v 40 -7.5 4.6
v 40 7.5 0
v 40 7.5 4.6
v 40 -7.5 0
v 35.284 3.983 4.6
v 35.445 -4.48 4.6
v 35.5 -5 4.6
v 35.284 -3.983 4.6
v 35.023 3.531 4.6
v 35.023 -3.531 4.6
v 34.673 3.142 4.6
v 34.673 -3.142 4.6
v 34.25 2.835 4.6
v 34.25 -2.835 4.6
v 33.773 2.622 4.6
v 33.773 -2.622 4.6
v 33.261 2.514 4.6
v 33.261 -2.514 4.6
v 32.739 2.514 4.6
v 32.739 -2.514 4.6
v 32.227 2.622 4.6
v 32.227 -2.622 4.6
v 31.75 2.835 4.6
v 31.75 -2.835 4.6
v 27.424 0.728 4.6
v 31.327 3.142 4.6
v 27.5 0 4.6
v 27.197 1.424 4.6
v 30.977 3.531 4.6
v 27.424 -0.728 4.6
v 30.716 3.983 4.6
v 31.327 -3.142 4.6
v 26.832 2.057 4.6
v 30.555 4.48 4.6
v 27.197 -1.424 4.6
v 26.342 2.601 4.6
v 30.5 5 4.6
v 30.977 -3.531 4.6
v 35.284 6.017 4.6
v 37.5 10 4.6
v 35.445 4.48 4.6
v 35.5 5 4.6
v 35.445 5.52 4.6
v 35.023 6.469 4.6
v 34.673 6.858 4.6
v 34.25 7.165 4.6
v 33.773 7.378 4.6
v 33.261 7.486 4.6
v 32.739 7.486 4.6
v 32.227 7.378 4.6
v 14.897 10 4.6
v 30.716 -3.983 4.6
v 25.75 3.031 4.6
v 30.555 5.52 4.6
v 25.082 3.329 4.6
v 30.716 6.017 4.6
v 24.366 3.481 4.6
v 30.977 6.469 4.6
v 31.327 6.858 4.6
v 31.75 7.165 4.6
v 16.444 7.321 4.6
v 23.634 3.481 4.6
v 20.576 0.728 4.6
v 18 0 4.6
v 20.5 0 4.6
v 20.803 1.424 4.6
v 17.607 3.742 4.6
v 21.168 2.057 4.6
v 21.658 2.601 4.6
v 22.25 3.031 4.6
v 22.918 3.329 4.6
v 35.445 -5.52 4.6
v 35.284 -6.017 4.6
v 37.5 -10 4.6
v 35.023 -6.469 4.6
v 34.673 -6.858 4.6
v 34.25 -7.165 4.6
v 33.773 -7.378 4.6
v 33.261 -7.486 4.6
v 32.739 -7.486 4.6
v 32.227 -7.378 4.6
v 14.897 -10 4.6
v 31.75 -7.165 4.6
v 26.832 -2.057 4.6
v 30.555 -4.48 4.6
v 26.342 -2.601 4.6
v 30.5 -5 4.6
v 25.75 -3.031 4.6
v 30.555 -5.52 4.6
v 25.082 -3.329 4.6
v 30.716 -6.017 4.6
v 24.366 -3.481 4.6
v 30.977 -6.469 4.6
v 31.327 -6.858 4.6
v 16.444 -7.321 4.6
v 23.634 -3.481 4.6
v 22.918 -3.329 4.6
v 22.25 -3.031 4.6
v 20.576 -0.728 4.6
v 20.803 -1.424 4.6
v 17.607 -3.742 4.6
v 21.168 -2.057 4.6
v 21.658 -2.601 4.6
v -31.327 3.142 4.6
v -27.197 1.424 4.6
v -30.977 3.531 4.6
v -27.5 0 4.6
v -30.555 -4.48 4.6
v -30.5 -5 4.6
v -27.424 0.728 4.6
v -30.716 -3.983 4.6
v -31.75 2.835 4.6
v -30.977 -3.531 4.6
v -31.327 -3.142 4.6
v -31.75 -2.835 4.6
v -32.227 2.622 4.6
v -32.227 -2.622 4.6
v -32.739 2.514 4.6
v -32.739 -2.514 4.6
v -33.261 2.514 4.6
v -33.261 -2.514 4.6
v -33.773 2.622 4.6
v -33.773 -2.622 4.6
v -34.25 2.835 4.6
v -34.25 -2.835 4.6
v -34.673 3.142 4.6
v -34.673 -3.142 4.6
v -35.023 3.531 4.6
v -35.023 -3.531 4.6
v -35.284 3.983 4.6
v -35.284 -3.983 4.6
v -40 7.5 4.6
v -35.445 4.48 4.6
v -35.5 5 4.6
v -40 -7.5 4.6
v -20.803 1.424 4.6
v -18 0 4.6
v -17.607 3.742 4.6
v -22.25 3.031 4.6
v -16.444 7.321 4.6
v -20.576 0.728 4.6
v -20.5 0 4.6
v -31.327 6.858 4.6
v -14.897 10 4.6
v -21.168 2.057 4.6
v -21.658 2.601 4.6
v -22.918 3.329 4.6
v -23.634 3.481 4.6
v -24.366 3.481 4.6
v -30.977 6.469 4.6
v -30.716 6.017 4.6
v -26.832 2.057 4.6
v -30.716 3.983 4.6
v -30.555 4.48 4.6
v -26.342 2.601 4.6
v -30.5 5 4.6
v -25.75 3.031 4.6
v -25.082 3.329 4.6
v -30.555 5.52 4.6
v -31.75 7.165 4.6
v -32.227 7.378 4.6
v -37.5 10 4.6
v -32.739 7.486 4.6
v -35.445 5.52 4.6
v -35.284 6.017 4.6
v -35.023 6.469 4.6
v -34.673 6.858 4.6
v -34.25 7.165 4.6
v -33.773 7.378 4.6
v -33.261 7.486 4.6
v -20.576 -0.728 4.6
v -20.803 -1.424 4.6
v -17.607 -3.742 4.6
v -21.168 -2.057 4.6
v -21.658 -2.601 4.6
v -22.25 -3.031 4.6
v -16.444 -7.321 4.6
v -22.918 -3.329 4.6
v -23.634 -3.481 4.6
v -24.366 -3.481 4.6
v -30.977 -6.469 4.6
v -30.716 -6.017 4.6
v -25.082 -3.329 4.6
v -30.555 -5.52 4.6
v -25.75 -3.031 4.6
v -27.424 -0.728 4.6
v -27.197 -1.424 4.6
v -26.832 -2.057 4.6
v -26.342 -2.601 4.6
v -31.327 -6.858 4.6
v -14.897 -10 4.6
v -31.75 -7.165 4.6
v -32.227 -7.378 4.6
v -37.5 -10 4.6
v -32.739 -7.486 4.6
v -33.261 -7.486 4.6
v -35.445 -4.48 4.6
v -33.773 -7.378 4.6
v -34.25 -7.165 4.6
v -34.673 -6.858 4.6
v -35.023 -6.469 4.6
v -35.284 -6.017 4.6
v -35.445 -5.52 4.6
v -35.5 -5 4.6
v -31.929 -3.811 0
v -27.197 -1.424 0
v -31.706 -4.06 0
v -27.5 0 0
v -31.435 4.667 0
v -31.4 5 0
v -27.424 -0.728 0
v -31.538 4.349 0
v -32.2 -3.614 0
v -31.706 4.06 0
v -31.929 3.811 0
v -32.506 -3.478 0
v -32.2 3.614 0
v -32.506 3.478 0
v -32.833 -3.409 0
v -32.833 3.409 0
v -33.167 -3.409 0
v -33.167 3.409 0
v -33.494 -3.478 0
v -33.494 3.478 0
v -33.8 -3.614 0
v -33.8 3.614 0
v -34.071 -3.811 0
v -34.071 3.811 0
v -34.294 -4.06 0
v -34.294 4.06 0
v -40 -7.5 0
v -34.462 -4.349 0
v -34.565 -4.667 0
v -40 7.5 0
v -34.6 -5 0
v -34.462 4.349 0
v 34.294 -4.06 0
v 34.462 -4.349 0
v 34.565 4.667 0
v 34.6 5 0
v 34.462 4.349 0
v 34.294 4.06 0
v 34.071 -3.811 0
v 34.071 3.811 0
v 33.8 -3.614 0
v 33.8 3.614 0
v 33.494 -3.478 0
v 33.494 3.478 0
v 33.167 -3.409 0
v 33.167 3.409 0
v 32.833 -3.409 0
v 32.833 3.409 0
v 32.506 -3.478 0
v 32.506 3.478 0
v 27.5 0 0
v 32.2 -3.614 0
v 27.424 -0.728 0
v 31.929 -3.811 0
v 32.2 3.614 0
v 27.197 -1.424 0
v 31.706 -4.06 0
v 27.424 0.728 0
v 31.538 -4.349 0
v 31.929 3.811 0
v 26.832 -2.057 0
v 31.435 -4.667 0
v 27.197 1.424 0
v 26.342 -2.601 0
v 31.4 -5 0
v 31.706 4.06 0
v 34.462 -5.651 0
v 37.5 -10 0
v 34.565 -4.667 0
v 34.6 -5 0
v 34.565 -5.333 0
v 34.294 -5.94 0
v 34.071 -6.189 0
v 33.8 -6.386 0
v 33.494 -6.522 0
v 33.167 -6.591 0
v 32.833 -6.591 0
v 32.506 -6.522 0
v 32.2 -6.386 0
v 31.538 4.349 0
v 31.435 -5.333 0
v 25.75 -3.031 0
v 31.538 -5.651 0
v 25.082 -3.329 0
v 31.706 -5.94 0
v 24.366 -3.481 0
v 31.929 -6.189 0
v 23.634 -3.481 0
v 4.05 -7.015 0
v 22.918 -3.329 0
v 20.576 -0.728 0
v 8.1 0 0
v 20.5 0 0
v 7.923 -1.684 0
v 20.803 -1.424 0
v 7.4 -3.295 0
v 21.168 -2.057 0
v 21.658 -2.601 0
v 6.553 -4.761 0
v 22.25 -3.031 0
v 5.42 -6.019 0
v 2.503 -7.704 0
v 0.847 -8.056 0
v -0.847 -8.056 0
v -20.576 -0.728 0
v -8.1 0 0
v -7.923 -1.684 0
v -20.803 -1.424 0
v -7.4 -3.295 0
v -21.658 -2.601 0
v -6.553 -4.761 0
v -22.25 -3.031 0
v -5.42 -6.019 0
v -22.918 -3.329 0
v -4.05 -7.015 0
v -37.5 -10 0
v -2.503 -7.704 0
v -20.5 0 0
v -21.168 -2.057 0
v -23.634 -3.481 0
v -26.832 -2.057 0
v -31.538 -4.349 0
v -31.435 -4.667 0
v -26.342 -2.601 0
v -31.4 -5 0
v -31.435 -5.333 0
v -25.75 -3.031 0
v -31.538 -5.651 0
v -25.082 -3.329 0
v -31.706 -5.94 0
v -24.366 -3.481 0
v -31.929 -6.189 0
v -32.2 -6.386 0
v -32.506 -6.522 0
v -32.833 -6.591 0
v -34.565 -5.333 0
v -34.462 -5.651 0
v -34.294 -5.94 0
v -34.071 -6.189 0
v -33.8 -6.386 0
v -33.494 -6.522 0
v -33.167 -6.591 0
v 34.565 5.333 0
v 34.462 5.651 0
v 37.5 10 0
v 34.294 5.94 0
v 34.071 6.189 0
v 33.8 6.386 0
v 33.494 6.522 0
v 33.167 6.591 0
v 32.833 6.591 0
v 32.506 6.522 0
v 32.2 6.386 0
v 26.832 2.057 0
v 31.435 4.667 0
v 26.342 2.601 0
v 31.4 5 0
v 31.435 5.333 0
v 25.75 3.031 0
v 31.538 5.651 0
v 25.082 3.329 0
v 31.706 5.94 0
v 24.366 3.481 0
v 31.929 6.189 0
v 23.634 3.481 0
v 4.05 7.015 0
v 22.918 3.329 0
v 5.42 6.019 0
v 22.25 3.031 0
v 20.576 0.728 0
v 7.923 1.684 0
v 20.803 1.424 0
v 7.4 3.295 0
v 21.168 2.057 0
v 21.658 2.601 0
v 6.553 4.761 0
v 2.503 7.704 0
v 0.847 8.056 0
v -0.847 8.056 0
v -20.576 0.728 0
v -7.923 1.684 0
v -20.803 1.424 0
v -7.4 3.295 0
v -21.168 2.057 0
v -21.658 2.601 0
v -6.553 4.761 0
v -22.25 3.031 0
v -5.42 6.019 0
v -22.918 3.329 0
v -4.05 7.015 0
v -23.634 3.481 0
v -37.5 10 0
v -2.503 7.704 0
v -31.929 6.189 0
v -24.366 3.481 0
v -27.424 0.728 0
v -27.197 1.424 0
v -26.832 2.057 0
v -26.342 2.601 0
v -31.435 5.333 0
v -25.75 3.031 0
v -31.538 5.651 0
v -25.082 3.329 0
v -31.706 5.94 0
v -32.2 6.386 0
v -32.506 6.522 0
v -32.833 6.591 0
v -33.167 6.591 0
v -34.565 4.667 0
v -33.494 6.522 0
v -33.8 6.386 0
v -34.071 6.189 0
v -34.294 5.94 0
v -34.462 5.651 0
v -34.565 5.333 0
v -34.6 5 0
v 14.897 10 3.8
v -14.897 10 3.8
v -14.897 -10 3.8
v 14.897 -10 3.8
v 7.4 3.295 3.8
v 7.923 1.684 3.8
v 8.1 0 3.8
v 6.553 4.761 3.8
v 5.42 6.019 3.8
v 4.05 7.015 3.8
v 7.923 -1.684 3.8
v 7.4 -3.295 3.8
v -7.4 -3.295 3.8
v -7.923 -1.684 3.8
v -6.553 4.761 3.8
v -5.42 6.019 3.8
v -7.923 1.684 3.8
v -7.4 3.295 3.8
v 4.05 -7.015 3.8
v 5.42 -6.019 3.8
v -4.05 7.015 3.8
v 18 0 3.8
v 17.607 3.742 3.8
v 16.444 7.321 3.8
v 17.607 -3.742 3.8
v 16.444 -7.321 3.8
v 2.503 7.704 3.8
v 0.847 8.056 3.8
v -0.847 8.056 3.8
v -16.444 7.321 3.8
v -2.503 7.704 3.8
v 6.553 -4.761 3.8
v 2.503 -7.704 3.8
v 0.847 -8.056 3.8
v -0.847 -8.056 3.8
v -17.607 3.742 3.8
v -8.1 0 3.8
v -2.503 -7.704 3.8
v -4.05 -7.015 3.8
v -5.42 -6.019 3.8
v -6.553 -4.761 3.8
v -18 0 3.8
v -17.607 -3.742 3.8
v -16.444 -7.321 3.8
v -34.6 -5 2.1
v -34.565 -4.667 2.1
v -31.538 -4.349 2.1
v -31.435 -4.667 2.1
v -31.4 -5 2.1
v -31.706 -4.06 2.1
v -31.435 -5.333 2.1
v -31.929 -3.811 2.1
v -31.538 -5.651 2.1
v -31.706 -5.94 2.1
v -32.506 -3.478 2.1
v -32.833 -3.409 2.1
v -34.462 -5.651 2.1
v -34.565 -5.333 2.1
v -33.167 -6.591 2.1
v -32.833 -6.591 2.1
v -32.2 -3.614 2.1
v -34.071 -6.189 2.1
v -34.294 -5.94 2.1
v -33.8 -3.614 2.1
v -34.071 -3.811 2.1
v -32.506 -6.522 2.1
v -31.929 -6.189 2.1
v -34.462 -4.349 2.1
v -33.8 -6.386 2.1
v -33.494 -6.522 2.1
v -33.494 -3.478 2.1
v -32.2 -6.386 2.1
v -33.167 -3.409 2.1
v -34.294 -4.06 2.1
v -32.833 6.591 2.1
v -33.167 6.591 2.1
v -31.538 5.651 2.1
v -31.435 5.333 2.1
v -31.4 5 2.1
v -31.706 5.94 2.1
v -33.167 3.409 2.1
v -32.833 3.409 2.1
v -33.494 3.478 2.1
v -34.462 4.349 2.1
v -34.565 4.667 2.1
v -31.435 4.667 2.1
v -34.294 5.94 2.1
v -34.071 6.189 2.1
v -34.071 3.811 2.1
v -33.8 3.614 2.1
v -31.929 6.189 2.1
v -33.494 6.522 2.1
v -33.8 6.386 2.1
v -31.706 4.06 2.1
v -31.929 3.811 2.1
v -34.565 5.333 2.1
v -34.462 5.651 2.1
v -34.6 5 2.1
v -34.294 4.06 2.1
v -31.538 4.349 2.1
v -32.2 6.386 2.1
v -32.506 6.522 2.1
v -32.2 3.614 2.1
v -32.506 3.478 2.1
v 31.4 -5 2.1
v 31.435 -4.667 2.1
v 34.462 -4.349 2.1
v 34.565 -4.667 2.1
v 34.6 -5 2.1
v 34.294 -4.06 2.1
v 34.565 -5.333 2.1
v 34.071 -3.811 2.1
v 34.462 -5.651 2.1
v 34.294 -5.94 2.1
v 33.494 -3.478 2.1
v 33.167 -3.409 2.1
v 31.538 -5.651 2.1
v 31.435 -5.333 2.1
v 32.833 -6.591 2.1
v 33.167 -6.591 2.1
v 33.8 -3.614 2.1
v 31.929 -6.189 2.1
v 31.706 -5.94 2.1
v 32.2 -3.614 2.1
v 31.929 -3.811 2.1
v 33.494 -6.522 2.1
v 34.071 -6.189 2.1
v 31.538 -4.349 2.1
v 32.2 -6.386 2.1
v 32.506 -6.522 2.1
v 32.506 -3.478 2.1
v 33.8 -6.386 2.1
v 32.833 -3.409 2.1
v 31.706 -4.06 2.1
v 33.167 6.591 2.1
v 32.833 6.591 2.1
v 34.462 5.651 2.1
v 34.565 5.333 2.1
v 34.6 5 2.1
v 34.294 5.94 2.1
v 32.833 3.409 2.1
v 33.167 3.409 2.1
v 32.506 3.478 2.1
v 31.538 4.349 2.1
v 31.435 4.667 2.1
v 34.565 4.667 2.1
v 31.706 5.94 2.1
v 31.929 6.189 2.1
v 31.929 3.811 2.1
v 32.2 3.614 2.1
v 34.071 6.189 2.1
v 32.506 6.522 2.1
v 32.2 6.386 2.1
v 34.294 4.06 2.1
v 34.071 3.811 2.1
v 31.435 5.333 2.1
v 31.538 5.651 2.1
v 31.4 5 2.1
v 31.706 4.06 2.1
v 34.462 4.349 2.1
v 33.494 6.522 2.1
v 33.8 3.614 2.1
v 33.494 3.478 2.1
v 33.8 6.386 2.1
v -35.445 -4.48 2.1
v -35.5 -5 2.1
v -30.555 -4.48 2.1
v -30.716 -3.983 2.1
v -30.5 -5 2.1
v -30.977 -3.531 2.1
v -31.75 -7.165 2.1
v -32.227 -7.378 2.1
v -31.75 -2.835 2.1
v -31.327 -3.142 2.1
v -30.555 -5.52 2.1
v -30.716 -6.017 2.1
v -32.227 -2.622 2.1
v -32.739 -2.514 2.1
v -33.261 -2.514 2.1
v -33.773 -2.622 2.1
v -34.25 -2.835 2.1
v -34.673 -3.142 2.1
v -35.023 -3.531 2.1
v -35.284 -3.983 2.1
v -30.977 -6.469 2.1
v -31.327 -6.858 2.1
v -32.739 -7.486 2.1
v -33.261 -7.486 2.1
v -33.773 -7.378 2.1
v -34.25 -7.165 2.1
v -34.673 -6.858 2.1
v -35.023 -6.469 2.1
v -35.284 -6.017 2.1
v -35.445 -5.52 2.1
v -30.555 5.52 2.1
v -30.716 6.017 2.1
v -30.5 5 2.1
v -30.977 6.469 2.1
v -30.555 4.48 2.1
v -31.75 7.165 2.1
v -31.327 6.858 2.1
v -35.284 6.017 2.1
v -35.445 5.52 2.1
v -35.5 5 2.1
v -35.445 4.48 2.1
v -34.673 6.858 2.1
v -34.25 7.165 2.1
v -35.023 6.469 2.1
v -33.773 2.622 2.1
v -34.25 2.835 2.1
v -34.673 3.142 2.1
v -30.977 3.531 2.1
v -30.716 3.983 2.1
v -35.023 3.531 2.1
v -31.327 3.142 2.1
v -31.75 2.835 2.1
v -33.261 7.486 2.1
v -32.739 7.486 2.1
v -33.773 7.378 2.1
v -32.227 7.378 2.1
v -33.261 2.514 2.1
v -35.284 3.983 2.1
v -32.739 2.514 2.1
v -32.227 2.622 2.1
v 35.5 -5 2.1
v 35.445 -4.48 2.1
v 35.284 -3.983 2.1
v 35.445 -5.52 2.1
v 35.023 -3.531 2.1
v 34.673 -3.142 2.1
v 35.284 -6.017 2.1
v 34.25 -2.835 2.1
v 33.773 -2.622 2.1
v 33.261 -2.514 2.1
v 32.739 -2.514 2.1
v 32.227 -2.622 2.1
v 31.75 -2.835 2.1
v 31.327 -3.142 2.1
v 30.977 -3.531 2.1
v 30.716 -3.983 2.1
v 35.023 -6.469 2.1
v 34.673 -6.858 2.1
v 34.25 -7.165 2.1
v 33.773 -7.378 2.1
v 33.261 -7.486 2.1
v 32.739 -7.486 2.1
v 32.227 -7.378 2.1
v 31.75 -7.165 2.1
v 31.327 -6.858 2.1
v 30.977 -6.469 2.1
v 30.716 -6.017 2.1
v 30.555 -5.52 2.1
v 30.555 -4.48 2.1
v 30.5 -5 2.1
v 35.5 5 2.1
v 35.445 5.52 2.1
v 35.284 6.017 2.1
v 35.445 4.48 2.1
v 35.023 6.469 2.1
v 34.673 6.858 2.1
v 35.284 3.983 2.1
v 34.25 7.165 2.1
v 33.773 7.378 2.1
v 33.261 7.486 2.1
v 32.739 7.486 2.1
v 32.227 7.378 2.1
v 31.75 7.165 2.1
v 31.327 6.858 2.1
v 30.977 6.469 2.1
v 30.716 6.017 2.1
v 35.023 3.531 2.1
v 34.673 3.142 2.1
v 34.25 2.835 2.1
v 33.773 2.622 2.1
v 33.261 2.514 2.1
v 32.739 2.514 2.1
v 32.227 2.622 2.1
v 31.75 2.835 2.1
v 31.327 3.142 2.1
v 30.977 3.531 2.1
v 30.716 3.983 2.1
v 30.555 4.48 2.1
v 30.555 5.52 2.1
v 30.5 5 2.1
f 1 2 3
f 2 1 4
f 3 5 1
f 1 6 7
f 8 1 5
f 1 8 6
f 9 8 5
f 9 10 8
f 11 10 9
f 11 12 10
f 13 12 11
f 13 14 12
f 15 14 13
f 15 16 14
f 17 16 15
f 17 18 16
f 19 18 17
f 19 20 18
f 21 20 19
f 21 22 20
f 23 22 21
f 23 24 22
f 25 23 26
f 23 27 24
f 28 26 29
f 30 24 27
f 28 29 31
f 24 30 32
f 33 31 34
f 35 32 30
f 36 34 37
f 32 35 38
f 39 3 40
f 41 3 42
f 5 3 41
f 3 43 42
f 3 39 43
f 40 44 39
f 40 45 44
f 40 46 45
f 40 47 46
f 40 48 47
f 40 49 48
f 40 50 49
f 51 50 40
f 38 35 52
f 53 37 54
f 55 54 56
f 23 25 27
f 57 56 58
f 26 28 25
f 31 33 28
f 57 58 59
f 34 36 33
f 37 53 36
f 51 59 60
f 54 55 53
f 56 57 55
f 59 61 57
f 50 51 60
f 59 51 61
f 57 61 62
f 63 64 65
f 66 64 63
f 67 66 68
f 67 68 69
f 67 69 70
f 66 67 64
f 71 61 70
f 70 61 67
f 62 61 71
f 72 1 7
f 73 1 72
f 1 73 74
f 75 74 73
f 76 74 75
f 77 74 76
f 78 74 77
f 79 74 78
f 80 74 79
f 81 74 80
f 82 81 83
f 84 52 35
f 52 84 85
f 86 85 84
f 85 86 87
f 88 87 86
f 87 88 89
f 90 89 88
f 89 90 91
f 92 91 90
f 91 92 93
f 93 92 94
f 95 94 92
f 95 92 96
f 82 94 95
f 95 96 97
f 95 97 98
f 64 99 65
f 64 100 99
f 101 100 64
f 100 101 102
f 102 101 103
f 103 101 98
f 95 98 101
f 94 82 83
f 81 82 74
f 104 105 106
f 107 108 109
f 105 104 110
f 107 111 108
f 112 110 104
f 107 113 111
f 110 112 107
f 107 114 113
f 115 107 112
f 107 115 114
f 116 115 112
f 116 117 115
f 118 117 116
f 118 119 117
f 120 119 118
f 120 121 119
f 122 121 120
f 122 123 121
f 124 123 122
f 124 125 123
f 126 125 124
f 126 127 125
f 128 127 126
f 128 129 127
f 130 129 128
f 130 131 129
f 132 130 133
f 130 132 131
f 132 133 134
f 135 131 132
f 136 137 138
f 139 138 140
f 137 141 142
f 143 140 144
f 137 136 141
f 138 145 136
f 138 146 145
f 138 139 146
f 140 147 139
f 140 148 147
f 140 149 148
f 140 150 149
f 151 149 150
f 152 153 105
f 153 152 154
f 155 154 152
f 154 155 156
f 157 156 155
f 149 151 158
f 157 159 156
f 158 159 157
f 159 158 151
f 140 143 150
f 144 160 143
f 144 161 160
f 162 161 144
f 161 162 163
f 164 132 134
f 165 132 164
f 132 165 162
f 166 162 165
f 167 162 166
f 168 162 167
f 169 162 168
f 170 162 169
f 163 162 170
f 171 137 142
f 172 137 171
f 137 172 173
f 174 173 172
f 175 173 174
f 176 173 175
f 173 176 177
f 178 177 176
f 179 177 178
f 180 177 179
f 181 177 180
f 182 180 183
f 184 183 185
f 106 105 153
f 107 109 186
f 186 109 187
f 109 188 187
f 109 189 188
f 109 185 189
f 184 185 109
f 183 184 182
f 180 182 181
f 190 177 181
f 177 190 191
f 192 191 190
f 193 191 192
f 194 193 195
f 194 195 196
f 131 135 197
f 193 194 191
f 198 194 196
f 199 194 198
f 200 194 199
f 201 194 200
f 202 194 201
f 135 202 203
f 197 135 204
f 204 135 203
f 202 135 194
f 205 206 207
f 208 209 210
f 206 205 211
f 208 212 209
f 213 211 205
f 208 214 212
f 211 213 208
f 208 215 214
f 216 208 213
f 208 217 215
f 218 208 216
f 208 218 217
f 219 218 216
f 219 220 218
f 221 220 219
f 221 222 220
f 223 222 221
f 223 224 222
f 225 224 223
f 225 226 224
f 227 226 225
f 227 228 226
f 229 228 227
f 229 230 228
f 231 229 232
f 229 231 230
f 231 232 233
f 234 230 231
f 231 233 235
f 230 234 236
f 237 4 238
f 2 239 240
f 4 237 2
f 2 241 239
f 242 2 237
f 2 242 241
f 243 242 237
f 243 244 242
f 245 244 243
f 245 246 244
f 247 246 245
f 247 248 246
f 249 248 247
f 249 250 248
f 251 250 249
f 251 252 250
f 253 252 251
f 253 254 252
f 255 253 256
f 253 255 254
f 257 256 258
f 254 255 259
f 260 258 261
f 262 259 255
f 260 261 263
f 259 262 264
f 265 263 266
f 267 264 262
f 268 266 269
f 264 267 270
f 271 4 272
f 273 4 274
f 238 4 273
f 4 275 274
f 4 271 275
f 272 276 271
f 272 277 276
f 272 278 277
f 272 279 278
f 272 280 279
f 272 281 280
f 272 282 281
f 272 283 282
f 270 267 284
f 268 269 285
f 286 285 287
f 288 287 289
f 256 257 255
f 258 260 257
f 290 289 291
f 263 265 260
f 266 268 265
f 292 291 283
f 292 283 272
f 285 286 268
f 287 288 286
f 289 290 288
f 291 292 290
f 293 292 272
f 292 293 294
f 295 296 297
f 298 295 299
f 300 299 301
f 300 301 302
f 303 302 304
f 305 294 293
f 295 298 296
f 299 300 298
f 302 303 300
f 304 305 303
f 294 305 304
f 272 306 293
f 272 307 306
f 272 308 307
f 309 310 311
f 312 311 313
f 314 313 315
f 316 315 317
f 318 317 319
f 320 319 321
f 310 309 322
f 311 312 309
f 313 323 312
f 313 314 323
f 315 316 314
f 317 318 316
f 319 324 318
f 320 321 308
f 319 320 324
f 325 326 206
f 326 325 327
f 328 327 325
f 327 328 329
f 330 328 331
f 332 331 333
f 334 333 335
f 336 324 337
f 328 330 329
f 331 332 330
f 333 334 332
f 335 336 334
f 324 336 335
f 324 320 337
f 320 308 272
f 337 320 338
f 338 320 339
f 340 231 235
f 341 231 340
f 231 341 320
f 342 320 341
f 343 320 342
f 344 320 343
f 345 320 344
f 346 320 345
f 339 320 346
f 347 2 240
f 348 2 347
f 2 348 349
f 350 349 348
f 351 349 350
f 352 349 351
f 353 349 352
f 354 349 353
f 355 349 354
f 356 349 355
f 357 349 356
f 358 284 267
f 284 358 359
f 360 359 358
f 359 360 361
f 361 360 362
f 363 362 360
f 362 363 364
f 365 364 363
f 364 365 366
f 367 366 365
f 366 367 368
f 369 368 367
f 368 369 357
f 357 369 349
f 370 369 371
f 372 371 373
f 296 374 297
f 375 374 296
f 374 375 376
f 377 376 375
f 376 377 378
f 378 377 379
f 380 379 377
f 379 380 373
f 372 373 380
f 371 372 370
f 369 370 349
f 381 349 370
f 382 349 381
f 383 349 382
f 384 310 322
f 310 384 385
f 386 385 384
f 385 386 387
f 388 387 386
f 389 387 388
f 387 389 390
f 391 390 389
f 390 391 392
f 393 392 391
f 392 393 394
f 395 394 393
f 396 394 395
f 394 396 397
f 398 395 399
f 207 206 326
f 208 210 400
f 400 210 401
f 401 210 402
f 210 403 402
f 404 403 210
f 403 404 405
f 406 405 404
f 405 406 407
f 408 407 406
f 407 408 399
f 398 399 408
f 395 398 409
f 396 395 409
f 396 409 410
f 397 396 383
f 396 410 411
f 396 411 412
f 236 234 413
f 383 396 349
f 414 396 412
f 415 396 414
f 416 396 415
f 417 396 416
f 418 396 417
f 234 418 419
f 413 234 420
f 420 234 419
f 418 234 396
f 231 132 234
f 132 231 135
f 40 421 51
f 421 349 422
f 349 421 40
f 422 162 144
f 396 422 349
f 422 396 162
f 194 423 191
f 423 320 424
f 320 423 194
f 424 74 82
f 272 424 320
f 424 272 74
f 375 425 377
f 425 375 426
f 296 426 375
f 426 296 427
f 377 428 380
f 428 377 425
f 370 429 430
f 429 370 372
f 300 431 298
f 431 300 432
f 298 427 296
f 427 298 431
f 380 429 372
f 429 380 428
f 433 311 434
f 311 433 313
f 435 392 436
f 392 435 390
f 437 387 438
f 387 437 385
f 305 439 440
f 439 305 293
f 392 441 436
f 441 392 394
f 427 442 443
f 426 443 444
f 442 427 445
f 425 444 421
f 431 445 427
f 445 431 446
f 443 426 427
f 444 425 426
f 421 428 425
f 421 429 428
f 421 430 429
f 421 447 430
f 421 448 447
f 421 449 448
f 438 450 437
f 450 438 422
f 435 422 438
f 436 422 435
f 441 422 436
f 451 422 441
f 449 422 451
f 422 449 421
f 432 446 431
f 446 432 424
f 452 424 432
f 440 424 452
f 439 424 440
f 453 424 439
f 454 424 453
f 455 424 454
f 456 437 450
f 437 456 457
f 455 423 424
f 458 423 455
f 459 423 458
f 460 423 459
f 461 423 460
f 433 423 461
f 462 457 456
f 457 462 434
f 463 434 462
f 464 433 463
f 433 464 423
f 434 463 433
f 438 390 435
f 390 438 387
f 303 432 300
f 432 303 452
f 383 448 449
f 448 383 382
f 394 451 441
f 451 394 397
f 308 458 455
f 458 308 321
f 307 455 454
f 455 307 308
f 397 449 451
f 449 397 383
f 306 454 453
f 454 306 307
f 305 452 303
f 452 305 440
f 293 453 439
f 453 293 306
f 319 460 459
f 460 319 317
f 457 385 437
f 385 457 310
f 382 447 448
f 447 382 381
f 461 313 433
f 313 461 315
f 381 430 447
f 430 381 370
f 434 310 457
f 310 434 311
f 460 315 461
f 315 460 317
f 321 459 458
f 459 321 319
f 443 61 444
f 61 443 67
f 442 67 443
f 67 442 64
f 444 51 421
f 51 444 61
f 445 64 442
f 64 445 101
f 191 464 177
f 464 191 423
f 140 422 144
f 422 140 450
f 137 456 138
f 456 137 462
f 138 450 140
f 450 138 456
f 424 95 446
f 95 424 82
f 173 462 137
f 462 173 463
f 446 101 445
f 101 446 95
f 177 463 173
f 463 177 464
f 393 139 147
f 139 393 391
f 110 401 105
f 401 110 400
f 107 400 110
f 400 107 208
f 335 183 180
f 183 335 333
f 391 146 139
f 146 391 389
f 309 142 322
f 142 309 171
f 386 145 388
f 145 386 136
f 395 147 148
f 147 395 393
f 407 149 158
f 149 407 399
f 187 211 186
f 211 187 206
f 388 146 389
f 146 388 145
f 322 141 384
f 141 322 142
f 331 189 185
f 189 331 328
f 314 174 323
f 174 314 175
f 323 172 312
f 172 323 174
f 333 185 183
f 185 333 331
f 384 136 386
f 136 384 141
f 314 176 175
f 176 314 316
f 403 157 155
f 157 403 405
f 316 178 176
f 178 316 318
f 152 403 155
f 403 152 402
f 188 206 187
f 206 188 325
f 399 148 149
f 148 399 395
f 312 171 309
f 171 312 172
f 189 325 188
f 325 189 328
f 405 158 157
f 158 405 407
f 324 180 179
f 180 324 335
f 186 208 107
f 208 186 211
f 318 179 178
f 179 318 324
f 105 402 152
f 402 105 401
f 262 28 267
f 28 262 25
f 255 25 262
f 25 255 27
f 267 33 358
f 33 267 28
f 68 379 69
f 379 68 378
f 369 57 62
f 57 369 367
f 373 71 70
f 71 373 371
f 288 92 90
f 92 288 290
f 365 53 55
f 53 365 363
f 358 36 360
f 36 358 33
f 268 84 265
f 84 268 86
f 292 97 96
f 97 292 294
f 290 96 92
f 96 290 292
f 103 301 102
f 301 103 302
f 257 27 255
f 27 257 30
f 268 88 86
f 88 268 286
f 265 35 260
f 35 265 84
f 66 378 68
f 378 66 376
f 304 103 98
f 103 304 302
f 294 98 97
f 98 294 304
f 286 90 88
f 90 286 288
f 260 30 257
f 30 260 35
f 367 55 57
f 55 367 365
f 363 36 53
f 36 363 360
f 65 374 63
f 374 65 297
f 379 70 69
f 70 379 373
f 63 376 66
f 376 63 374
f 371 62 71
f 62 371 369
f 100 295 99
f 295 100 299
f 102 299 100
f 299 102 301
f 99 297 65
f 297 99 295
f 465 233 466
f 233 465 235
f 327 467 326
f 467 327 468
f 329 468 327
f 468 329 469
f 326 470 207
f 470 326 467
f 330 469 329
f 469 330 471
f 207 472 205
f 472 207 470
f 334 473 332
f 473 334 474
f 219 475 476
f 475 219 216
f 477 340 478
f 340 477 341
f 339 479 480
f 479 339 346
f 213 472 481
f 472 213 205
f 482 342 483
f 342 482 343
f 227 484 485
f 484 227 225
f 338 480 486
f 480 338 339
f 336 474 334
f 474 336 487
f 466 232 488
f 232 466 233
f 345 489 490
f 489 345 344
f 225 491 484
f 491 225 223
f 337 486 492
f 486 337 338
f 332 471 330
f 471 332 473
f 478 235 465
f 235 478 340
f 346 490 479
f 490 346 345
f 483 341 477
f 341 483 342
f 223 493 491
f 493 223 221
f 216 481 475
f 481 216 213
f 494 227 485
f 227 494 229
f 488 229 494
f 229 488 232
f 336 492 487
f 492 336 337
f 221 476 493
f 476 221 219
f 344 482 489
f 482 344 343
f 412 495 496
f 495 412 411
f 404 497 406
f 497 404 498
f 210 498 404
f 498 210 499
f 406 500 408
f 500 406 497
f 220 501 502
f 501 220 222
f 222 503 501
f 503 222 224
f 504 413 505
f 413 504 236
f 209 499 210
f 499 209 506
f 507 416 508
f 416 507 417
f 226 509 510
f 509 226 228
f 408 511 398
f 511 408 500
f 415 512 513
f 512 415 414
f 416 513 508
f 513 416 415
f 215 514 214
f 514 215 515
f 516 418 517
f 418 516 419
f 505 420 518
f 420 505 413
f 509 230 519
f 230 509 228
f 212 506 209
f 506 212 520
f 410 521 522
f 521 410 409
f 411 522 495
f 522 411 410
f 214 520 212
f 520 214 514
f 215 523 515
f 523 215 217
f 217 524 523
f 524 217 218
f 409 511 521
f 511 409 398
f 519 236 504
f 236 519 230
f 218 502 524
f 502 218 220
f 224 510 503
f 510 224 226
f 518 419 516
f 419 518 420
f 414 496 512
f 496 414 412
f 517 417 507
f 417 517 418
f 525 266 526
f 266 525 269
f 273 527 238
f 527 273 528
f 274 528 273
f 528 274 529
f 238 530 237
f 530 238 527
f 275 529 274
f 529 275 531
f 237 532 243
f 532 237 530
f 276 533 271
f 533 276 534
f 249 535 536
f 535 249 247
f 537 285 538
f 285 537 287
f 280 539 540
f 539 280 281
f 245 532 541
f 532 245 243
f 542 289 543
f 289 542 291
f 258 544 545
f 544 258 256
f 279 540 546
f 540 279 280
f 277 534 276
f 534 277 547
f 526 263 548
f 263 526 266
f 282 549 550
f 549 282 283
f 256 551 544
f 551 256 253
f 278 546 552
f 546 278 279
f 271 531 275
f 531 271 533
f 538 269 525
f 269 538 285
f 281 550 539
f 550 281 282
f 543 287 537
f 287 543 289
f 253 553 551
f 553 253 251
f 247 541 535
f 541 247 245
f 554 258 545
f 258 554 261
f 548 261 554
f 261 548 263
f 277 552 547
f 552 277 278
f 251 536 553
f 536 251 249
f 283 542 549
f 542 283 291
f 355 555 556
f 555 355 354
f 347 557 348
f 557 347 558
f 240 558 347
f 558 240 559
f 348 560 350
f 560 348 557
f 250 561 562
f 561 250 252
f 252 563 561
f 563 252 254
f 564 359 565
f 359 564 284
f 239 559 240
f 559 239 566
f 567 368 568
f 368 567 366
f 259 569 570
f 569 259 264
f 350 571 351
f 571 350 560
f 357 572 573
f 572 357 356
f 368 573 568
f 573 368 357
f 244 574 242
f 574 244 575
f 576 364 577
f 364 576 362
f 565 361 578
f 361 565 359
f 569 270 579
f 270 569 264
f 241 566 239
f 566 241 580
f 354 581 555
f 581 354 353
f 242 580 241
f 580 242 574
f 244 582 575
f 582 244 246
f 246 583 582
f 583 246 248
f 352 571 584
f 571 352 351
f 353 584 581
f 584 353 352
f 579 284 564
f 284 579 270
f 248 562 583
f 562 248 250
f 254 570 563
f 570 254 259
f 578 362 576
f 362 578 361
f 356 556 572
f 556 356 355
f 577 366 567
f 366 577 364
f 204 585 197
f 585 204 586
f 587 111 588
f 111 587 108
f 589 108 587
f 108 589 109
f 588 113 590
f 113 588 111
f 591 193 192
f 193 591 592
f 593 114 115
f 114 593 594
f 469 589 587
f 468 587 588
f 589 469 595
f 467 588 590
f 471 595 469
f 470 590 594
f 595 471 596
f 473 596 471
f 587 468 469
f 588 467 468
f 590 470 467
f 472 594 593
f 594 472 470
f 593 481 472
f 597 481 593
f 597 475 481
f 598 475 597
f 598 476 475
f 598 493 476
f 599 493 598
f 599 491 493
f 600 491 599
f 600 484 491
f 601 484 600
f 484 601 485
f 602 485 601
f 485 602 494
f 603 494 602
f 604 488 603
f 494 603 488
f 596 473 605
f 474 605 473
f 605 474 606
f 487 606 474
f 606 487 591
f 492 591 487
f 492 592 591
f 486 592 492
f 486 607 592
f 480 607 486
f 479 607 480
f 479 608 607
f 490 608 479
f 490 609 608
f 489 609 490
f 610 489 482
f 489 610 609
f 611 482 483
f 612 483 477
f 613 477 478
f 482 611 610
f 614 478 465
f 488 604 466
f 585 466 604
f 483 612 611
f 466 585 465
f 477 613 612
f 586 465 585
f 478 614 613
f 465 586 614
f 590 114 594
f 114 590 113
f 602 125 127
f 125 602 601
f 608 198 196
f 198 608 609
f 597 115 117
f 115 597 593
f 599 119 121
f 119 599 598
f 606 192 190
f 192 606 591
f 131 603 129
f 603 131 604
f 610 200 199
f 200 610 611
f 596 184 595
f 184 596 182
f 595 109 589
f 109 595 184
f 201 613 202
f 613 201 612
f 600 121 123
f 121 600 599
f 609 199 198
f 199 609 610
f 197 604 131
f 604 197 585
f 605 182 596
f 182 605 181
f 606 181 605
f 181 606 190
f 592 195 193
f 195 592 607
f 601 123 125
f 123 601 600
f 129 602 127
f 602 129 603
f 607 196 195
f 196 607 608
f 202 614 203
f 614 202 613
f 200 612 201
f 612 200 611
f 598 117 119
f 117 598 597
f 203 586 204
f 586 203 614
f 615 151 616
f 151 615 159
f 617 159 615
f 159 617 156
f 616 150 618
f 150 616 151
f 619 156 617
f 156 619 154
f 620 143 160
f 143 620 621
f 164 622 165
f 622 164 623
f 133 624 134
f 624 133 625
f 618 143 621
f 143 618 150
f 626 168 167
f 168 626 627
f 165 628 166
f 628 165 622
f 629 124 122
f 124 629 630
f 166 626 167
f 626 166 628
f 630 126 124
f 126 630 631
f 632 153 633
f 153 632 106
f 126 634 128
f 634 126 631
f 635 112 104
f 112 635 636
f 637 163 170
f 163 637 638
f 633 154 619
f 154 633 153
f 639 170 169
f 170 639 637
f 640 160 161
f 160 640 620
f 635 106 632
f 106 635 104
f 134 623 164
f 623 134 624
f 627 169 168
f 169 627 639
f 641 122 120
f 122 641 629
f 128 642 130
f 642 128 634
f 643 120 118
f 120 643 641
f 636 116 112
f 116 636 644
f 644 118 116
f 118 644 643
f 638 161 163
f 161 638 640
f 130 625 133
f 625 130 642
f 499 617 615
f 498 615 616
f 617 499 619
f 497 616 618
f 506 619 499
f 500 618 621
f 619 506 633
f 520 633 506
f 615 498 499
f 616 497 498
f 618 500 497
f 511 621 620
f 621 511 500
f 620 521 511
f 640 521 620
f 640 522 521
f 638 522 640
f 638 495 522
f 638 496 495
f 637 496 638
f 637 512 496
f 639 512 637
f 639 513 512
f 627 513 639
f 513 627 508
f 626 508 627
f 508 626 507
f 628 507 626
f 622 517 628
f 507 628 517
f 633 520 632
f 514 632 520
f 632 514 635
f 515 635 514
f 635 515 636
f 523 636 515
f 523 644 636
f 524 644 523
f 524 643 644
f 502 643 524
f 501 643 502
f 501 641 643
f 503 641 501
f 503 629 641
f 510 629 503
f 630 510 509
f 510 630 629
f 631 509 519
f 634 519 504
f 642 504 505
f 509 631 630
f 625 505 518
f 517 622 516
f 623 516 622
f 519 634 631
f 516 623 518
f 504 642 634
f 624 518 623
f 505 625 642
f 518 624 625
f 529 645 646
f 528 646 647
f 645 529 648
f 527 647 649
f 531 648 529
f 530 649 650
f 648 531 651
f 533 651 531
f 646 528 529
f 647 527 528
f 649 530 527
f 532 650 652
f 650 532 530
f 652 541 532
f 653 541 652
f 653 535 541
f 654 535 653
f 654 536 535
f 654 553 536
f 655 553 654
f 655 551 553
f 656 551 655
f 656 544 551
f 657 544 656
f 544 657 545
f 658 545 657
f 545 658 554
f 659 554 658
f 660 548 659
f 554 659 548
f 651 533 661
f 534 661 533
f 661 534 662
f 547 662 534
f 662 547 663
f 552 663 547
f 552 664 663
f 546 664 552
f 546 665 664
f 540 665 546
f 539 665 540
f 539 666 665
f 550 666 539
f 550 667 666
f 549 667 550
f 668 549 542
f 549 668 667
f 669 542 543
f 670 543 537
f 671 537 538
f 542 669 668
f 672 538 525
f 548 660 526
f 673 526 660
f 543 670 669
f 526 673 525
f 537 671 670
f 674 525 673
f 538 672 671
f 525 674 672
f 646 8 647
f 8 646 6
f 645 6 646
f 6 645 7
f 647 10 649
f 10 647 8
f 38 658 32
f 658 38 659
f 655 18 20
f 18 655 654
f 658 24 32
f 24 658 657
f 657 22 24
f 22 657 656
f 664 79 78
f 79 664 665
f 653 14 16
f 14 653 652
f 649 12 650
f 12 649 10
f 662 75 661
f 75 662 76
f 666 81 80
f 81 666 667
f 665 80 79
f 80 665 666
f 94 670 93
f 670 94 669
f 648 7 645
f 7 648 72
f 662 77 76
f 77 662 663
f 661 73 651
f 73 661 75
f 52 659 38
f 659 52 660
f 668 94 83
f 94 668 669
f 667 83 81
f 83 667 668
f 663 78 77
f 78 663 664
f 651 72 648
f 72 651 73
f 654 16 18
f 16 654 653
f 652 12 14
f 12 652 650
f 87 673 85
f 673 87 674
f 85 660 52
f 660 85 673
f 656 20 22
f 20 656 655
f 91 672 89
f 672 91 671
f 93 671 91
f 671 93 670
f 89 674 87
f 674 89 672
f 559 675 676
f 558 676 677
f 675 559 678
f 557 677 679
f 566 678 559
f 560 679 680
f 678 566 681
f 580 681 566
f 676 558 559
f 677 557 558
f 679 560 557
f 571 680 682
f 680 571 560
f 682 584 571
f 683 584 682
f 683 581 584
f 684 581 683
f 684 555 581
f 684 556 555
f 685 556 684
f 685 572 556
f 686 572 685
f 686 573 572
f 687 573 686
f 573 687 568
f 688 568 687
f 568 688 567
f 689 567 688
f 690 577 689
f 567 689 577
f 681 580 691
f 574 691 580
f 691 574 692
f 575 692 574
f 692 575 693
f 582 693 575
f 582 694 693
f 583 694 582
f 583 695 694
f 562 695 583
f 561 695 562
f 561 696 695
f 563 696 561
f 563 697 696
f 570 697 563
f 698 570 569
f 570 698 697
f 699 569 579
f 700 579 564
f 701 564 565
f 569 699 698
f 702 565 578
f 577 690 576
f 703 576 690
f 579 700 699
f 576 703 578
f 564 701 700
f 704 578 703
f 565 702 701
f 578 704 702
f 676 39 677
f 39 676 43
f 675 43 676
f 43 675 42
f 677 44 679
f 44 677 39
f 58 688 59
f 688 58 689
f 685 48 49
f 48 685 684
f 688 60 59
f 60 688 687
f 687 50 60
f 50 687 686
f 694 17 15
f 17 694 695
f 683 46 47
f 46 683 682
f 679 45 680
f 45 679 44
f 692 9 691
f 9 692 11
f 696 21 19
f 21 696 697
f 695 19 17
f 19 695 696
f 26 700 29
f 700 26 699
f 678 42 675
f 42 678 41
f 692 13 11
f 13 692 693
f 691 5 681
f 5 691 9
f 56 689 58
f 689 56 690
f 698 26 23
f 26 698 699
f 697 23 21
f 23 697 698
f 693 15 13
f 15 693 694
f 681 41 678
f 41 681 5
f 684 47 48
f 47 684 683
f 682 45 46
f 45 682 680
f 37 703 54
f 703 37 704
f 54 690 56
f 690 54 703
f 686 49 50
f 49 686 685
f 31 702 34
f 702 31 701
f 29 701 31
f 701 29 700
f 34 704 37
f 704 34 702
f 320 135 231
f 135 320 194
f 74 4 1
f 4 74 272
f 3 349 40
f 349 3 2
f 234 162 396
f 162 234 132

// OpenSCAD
// RebeliX
//
// piezo holder
// GNU GPL v3
// jacho
// http://www.mlab.cz

fan_width = 40;
fan_diameter = 38;
fan_mount = 33;

spring_diameter=5;
spring_height=6.5;  //4,5mm zmáčklá koukat tak 1mm mezera
spring_hole=2.5;

hotend_diameter=16.2;
hotend_height=4.8;
hotend_height_tolerance=1;

piezo_diameter=36;
piezo_height=2.2;
piezo_height_tolerance=1.4;

cylinder_diameter=piezo_diameter+5;
cylinder_height= 1+hotend_height+piezo_height-hotend_height_tolerance-piezo_height_tolerance;
cylinder_hole= 1.1;

cube_length=80;
cube_width=20;

holder_pitch=48;
holder_diameter=7;

mount_height = 1+hotend_height+piezo_height-hotend_height_tolerance-piezo_height_tolerance-1;

M3_vyska_matky=3;
M3_sirka_matky=6.7;



difference(){
	union(){
	  translate([0,0,mount_height/2])
        cube([cube_length,cube_width,mount_height],true);
	   
	}	

	//otvor pro hotend
	translate([0,0,0.0]) cylinder(r=hotend_diameter/2,h=hotend_height-hotend_height_tolerance,$fn=30);
	
	//otvor pro piezo	
	translate([0,0,hotend_height-hotend_height_tolerance]) cylinder(r=piezo_diameter/2,h=piezo_height-piezo_height_tolerance,$fn=30);
	
	// Otvory pro prisroubovani
	translate([-holder_pitch/2,0,-0.1]) cylinder(r=holder_diameter/2,h=mount_height+1,$fn=30);
	
		
	translate([holder_pitch/2,0,-0.1]) cylinder(r=holder_diameter/2,h=mount_height+1,$fn=30);
	
	
	
	//otvory na šrouby
    translate([-cube_length/2+7,-5,-0.1]) cylinder(r=3.2/2,h=mount_height+1,$fn=30);
	
	
    
    translate([-cube_length/2+7,5,-0.1]) cylinder(r=3.2/2,h=mount_height+1,$fn=30);
	
	
    
    
        translate([cube_length/2-7,-5,-0.1]) cylinder(r=3.2/2,h=mount_height+1,$fn=30);
	
   	
    
    translate([cube_length/2-7,5,-0.1]) cylinder(r=3.2/2,h=mount_height+1,$fn=30);
	
    
	//otvory na pružiny
    translate([-cube_length/2+7,-5,mount_height-spring_hole]) cylinder(r=spring_diameter/2,h=spring_hole,$fn=30);
	
	
    
    translate([-cube_length/2+7,5,mount_height-spring_hole]) cylinder(r=spring_diameter/2,h=spring_hole,$fn=30);
	
	
    
    
        translate([cube_length/2-7,-5,mount_height-spring_hole]) cylinder(r=spring_diameter/2,h=spring_hole,$fn=30);
	
   	
    
    translate([cube_length/2-7,5,mount_height-spring_hole]) cylinder(r=spring_diameter/2,h=spring_hole,$fn=30);
	
	
	
	// Seriznute rohy
	translate([-cube_length/2+2.5,-cube_width/2,-0.1]) rotate([0,0,135]) cube([5,5,10]);
	translate([cube_length/2-2.5,-cube_width/2,-0.1]) rotate([0,0,-45]) cube([5,5,10]);
	translate([cube_length/2,cube_width/2-2.5,-0.1]) rotate([0,0,45]) cube([5,5,10]);
	translate([-cube_length/2+2.5,cube_width/2,-0.1]) rotate([0,0,135]) cube([5,5,10]);
}	
